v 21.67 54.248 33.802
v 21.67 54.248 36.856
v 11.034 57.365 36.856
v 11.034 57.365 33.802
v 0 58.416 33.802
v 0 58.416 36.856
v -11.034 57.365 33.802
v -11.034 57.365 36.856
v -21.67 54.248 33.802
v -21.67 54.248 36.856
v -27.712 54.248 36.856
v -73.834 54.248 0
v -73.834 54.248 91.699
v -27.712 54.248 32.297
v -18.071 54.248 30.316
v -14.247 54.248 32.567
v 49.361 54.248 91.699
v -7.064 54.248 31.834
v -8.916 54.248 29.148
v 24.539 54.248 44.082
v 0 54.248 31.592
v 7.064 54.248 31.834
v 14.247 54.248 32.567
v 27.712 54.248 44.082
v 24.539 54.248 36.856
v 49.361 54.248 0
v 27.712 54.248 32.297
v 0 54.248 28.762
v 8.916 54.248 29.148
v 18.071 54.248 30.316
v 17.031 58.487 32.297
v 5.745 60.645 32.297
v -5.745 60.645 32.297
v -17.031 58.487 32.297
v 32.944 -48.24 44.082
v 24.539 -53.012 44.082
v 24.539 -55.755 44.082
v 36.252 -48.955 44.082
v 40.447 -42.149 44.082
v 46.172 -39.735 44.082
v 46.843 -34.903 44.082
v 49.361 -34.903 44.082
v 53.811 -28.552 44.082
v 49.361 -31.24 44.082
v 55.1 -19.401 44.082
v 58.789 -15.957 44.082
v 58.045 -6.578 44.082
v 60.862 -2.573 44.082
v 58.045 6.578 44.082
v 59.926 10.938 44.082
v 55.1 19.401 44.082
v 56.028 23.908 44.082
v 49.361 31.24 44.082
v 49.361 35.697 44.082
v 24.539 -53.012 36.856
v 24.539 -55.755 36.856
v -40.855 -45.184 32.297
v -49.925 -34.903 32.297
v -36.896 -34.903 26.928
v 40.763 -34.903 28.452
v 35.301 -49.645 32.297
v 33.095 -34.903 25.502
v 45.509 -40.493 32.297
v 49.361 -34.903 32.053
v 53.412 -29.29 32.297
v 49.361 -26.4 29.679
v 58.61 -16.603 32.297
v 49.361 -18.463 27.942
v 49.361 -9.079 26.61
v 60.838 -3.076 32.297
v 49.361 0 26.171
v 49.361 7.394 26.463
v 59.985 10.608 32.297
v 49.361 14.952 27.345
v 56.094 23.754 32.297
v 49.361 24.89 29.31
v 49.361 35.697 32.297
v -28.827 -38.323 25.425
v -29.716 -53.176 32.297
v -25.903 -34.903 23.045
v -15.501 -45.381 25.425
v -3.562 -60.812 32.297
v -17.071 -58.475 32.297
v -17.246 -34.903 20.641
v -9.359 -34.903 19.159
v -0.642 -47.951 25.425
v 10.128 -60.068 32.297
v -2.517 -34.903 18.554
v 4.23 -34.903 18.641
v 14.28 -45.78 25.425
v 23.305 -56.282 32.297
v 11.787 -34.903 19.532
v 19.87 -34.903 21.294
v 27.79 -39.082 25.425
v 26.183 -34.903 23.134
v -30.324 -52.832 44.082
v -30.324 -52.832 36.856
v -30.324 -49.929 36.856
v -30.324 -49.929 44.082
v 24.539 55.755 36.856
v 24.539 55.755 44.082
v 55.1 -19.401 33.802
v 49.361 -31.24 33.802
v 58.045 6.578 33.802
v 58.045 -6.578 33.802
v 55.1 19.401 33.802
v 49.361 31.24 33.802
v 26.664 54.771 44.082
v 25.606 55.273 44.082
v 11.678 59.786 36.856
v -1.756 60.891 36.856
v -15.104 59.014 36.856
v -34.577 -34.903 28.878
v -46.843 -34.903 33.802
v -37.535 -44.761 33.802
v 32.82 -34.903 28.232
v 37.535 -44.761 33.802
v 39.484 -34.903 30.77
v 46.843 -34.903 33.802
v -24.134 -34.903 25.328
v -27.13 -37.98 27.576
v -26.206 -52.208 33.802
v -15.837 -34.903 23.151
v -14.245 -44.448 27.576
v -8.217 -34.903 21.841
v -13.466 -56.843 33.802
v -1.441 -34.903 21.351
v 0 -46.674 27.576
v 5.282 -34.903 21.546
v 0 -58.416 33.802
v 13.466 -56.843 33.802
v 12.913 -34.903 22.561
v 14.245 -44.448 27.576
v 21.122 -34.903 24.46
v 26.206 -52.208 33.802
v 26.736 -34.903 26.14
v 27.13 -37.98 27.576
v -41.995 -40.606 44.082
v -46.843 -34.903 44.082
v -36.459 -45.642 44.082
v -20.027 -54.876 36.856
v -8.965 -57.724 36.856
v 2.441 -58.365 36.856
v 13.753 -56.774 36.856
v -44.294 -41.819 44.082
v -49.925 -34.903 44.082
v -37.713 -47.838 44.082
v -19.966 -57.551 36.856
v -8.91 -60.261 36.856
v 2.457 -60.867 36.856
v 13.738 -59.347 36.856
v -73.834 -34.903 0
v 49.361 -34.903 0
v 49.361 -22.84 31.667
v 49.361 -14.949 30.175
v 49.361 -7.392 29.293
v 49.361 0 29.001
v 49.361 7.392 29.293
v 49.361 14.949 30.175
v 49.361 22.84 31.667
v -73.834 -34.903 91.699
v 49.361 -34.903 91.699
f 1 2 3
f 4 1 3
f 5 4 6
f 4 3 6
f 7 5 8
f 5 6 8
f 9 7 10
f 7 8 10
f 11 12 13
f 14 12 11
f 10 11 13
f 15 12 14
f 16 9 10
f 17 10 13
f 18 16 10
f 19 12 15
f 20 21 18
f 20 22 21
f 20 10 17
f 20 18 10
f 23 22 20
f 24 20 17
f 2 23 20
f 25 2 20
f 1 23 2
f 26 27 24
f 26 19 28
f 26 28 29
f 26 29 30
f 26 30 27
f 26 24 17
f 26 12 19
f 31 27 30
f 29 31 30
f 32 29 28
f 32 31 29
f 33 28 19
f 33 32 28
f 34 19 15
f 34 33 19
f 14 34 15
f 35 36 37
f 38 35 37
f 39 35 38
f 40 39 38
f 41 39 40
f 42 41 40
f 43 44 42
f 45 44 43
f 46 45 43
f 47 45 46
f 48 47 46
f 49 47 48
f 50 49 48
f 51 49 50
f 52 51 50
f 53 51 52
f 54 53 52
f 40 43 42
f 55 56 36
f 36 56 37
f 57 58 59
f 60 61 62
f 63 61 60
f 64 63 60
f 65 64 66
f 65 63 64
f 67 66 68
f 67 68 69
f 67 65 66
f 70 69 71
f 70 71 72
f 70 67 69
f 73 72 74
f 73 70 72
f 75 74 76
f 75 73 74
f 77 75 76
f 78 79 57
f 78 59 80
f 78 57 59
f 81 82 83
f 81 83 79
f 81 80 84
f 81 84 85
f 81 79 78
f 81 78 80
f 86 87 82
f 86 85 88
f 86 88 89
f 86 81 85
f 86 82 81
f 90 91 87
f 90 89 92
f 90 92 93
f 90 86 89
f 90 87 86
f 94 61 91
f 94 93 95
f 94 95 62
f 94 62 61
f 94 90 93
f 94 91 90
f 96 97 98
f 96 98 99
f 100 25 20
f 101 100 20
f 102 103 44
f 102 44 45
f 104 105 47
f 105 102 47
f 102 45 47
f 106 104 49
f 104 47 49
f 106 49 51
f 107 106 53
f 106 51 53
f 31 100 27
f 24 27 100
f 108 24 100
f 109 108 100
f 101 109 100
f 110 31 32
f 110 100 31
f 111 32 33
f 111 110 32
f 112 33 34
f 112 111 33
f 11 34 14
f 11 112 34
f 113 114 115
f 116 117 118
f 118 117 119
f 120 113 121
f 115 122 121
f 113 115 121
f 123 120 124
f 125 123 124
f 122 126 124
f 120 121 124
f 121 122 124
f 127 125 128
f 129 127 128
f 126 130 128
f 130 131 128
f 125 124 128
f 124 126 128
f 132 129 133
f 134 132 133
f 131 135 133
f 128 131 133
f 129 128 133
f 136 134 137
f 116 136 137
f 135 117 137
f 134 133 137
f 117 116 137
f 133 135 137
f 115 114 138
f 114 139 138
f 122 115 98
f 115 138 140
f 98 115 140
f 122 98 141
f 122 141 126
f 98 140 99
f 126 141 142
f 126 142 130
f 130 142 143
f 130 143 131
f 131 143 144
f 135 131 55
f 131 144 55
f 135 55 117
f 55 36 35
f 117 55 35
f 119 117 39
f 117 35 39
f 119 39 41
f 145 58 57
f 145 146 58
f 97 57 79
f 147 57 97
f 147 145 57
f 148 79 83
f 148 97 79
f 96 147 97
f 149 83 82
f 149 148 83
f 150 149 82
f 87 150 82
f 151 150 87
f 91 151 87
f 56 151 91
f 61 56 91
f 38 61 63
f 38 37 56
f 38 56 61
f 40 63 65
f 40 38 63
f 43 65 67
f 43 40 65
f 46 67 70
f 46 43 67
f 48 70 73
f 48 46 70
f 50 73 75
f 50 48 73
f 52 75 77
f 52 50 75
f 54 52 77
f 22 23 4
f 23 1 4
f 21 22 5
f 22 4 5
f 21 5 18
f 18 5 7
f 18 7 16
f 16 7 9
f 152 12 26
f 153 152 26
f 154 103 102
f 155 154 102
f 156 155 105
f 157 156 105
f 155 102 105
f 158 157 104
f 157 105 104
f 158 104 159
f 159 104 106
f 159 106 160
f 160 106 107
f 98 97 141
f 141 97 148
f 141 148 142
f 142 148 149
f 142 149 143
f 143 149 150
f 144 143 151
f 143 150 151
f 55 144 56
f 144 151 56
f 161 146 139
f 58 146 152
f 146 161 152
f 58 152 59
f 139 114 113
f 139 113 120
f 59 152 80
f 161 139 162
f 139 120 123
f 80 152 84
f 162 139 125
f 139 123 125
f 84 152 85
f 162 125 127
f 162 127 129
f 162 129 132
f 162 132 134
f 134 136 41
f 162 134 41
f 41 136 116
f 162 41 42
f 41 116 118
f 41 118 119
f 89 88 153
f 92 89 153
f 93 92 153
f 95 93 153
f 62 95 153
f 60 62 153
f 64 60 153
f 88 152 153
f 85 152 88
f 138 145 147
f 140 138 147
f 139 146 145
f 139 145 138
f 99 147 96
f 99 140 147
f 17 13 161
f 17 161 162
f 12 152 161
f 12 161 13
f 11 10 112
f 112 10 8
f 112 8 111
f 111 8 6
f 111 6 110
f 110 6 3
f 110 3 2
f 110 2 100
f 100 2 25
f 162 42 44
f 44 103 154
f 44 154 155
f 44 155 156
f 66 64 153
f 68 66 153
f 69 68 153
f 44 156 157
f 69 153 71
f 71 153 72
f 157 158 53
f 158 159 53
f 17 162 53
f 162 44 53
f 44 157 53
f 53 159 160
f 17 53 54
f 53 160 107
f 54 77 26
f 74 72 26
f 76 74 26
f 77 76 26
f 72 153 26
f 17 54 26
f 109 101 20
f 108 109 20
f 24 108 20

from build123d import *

# Parameters (mm, degrees)
F2_T     = -2.5
F3_W     = 54.863745
F3_H     = 16.608417
F4_DEPTH = 104.5
F5_W     = 77.0705
F5_H     = 24.25948
F6_DEPTH = 90.4
F8_W     = 123.194821
F8_H     = 89.151054
F9_DEPTH = 91.698781


with BuildPart() as f1:
    # F0 (on Front) → F1 (revolve)
    with BuildSketch(Plane.XZ):
        Polygon((0, 44.082265), (0, 0), (60.916152, 32.297436), (60.916152, 44.082265), align=None)
    revolve(axis=Axis((0, 0, 22.041133), (0, 0, 1)))

    # F2
    f2_openings = [f1.faces().sort_by_distance(p)[0] for p in [
        (0, 0, 44.082265),
    ]]
    offset(amount=F2_T, openings=f2_openings)

    # F3 (on Front) → F4 (cut, symmetric)
    with BuildSketch(Plane.XZ):
        with Locations((-2.892476, 45.159954)):
            Rectangle(F3_W, F3_H)
    extrude(amount=F4_DEPTH, both=True, mode=Mode.SUBTRACT)

    # F5 (on Right) → F6 (cut, symmetric)
    with BuildSketch(Plane.YZ):
        with Locations((-2.79917, -1.772808)):
            Rectangle(F5_W, F5_H)
    extrude(amount=F6_DEPTH, both=True, mode=Mode.SUBTRACT)

    # F8 (on face) → F9 (join)
    with BuildSketch(Plane.XY):
        with Locations((-12.236293, 9.672433)):
            Rectangle(F8_W, F8_H)
    extrude(amount=F9_DEPTH)


solid = f1.part
